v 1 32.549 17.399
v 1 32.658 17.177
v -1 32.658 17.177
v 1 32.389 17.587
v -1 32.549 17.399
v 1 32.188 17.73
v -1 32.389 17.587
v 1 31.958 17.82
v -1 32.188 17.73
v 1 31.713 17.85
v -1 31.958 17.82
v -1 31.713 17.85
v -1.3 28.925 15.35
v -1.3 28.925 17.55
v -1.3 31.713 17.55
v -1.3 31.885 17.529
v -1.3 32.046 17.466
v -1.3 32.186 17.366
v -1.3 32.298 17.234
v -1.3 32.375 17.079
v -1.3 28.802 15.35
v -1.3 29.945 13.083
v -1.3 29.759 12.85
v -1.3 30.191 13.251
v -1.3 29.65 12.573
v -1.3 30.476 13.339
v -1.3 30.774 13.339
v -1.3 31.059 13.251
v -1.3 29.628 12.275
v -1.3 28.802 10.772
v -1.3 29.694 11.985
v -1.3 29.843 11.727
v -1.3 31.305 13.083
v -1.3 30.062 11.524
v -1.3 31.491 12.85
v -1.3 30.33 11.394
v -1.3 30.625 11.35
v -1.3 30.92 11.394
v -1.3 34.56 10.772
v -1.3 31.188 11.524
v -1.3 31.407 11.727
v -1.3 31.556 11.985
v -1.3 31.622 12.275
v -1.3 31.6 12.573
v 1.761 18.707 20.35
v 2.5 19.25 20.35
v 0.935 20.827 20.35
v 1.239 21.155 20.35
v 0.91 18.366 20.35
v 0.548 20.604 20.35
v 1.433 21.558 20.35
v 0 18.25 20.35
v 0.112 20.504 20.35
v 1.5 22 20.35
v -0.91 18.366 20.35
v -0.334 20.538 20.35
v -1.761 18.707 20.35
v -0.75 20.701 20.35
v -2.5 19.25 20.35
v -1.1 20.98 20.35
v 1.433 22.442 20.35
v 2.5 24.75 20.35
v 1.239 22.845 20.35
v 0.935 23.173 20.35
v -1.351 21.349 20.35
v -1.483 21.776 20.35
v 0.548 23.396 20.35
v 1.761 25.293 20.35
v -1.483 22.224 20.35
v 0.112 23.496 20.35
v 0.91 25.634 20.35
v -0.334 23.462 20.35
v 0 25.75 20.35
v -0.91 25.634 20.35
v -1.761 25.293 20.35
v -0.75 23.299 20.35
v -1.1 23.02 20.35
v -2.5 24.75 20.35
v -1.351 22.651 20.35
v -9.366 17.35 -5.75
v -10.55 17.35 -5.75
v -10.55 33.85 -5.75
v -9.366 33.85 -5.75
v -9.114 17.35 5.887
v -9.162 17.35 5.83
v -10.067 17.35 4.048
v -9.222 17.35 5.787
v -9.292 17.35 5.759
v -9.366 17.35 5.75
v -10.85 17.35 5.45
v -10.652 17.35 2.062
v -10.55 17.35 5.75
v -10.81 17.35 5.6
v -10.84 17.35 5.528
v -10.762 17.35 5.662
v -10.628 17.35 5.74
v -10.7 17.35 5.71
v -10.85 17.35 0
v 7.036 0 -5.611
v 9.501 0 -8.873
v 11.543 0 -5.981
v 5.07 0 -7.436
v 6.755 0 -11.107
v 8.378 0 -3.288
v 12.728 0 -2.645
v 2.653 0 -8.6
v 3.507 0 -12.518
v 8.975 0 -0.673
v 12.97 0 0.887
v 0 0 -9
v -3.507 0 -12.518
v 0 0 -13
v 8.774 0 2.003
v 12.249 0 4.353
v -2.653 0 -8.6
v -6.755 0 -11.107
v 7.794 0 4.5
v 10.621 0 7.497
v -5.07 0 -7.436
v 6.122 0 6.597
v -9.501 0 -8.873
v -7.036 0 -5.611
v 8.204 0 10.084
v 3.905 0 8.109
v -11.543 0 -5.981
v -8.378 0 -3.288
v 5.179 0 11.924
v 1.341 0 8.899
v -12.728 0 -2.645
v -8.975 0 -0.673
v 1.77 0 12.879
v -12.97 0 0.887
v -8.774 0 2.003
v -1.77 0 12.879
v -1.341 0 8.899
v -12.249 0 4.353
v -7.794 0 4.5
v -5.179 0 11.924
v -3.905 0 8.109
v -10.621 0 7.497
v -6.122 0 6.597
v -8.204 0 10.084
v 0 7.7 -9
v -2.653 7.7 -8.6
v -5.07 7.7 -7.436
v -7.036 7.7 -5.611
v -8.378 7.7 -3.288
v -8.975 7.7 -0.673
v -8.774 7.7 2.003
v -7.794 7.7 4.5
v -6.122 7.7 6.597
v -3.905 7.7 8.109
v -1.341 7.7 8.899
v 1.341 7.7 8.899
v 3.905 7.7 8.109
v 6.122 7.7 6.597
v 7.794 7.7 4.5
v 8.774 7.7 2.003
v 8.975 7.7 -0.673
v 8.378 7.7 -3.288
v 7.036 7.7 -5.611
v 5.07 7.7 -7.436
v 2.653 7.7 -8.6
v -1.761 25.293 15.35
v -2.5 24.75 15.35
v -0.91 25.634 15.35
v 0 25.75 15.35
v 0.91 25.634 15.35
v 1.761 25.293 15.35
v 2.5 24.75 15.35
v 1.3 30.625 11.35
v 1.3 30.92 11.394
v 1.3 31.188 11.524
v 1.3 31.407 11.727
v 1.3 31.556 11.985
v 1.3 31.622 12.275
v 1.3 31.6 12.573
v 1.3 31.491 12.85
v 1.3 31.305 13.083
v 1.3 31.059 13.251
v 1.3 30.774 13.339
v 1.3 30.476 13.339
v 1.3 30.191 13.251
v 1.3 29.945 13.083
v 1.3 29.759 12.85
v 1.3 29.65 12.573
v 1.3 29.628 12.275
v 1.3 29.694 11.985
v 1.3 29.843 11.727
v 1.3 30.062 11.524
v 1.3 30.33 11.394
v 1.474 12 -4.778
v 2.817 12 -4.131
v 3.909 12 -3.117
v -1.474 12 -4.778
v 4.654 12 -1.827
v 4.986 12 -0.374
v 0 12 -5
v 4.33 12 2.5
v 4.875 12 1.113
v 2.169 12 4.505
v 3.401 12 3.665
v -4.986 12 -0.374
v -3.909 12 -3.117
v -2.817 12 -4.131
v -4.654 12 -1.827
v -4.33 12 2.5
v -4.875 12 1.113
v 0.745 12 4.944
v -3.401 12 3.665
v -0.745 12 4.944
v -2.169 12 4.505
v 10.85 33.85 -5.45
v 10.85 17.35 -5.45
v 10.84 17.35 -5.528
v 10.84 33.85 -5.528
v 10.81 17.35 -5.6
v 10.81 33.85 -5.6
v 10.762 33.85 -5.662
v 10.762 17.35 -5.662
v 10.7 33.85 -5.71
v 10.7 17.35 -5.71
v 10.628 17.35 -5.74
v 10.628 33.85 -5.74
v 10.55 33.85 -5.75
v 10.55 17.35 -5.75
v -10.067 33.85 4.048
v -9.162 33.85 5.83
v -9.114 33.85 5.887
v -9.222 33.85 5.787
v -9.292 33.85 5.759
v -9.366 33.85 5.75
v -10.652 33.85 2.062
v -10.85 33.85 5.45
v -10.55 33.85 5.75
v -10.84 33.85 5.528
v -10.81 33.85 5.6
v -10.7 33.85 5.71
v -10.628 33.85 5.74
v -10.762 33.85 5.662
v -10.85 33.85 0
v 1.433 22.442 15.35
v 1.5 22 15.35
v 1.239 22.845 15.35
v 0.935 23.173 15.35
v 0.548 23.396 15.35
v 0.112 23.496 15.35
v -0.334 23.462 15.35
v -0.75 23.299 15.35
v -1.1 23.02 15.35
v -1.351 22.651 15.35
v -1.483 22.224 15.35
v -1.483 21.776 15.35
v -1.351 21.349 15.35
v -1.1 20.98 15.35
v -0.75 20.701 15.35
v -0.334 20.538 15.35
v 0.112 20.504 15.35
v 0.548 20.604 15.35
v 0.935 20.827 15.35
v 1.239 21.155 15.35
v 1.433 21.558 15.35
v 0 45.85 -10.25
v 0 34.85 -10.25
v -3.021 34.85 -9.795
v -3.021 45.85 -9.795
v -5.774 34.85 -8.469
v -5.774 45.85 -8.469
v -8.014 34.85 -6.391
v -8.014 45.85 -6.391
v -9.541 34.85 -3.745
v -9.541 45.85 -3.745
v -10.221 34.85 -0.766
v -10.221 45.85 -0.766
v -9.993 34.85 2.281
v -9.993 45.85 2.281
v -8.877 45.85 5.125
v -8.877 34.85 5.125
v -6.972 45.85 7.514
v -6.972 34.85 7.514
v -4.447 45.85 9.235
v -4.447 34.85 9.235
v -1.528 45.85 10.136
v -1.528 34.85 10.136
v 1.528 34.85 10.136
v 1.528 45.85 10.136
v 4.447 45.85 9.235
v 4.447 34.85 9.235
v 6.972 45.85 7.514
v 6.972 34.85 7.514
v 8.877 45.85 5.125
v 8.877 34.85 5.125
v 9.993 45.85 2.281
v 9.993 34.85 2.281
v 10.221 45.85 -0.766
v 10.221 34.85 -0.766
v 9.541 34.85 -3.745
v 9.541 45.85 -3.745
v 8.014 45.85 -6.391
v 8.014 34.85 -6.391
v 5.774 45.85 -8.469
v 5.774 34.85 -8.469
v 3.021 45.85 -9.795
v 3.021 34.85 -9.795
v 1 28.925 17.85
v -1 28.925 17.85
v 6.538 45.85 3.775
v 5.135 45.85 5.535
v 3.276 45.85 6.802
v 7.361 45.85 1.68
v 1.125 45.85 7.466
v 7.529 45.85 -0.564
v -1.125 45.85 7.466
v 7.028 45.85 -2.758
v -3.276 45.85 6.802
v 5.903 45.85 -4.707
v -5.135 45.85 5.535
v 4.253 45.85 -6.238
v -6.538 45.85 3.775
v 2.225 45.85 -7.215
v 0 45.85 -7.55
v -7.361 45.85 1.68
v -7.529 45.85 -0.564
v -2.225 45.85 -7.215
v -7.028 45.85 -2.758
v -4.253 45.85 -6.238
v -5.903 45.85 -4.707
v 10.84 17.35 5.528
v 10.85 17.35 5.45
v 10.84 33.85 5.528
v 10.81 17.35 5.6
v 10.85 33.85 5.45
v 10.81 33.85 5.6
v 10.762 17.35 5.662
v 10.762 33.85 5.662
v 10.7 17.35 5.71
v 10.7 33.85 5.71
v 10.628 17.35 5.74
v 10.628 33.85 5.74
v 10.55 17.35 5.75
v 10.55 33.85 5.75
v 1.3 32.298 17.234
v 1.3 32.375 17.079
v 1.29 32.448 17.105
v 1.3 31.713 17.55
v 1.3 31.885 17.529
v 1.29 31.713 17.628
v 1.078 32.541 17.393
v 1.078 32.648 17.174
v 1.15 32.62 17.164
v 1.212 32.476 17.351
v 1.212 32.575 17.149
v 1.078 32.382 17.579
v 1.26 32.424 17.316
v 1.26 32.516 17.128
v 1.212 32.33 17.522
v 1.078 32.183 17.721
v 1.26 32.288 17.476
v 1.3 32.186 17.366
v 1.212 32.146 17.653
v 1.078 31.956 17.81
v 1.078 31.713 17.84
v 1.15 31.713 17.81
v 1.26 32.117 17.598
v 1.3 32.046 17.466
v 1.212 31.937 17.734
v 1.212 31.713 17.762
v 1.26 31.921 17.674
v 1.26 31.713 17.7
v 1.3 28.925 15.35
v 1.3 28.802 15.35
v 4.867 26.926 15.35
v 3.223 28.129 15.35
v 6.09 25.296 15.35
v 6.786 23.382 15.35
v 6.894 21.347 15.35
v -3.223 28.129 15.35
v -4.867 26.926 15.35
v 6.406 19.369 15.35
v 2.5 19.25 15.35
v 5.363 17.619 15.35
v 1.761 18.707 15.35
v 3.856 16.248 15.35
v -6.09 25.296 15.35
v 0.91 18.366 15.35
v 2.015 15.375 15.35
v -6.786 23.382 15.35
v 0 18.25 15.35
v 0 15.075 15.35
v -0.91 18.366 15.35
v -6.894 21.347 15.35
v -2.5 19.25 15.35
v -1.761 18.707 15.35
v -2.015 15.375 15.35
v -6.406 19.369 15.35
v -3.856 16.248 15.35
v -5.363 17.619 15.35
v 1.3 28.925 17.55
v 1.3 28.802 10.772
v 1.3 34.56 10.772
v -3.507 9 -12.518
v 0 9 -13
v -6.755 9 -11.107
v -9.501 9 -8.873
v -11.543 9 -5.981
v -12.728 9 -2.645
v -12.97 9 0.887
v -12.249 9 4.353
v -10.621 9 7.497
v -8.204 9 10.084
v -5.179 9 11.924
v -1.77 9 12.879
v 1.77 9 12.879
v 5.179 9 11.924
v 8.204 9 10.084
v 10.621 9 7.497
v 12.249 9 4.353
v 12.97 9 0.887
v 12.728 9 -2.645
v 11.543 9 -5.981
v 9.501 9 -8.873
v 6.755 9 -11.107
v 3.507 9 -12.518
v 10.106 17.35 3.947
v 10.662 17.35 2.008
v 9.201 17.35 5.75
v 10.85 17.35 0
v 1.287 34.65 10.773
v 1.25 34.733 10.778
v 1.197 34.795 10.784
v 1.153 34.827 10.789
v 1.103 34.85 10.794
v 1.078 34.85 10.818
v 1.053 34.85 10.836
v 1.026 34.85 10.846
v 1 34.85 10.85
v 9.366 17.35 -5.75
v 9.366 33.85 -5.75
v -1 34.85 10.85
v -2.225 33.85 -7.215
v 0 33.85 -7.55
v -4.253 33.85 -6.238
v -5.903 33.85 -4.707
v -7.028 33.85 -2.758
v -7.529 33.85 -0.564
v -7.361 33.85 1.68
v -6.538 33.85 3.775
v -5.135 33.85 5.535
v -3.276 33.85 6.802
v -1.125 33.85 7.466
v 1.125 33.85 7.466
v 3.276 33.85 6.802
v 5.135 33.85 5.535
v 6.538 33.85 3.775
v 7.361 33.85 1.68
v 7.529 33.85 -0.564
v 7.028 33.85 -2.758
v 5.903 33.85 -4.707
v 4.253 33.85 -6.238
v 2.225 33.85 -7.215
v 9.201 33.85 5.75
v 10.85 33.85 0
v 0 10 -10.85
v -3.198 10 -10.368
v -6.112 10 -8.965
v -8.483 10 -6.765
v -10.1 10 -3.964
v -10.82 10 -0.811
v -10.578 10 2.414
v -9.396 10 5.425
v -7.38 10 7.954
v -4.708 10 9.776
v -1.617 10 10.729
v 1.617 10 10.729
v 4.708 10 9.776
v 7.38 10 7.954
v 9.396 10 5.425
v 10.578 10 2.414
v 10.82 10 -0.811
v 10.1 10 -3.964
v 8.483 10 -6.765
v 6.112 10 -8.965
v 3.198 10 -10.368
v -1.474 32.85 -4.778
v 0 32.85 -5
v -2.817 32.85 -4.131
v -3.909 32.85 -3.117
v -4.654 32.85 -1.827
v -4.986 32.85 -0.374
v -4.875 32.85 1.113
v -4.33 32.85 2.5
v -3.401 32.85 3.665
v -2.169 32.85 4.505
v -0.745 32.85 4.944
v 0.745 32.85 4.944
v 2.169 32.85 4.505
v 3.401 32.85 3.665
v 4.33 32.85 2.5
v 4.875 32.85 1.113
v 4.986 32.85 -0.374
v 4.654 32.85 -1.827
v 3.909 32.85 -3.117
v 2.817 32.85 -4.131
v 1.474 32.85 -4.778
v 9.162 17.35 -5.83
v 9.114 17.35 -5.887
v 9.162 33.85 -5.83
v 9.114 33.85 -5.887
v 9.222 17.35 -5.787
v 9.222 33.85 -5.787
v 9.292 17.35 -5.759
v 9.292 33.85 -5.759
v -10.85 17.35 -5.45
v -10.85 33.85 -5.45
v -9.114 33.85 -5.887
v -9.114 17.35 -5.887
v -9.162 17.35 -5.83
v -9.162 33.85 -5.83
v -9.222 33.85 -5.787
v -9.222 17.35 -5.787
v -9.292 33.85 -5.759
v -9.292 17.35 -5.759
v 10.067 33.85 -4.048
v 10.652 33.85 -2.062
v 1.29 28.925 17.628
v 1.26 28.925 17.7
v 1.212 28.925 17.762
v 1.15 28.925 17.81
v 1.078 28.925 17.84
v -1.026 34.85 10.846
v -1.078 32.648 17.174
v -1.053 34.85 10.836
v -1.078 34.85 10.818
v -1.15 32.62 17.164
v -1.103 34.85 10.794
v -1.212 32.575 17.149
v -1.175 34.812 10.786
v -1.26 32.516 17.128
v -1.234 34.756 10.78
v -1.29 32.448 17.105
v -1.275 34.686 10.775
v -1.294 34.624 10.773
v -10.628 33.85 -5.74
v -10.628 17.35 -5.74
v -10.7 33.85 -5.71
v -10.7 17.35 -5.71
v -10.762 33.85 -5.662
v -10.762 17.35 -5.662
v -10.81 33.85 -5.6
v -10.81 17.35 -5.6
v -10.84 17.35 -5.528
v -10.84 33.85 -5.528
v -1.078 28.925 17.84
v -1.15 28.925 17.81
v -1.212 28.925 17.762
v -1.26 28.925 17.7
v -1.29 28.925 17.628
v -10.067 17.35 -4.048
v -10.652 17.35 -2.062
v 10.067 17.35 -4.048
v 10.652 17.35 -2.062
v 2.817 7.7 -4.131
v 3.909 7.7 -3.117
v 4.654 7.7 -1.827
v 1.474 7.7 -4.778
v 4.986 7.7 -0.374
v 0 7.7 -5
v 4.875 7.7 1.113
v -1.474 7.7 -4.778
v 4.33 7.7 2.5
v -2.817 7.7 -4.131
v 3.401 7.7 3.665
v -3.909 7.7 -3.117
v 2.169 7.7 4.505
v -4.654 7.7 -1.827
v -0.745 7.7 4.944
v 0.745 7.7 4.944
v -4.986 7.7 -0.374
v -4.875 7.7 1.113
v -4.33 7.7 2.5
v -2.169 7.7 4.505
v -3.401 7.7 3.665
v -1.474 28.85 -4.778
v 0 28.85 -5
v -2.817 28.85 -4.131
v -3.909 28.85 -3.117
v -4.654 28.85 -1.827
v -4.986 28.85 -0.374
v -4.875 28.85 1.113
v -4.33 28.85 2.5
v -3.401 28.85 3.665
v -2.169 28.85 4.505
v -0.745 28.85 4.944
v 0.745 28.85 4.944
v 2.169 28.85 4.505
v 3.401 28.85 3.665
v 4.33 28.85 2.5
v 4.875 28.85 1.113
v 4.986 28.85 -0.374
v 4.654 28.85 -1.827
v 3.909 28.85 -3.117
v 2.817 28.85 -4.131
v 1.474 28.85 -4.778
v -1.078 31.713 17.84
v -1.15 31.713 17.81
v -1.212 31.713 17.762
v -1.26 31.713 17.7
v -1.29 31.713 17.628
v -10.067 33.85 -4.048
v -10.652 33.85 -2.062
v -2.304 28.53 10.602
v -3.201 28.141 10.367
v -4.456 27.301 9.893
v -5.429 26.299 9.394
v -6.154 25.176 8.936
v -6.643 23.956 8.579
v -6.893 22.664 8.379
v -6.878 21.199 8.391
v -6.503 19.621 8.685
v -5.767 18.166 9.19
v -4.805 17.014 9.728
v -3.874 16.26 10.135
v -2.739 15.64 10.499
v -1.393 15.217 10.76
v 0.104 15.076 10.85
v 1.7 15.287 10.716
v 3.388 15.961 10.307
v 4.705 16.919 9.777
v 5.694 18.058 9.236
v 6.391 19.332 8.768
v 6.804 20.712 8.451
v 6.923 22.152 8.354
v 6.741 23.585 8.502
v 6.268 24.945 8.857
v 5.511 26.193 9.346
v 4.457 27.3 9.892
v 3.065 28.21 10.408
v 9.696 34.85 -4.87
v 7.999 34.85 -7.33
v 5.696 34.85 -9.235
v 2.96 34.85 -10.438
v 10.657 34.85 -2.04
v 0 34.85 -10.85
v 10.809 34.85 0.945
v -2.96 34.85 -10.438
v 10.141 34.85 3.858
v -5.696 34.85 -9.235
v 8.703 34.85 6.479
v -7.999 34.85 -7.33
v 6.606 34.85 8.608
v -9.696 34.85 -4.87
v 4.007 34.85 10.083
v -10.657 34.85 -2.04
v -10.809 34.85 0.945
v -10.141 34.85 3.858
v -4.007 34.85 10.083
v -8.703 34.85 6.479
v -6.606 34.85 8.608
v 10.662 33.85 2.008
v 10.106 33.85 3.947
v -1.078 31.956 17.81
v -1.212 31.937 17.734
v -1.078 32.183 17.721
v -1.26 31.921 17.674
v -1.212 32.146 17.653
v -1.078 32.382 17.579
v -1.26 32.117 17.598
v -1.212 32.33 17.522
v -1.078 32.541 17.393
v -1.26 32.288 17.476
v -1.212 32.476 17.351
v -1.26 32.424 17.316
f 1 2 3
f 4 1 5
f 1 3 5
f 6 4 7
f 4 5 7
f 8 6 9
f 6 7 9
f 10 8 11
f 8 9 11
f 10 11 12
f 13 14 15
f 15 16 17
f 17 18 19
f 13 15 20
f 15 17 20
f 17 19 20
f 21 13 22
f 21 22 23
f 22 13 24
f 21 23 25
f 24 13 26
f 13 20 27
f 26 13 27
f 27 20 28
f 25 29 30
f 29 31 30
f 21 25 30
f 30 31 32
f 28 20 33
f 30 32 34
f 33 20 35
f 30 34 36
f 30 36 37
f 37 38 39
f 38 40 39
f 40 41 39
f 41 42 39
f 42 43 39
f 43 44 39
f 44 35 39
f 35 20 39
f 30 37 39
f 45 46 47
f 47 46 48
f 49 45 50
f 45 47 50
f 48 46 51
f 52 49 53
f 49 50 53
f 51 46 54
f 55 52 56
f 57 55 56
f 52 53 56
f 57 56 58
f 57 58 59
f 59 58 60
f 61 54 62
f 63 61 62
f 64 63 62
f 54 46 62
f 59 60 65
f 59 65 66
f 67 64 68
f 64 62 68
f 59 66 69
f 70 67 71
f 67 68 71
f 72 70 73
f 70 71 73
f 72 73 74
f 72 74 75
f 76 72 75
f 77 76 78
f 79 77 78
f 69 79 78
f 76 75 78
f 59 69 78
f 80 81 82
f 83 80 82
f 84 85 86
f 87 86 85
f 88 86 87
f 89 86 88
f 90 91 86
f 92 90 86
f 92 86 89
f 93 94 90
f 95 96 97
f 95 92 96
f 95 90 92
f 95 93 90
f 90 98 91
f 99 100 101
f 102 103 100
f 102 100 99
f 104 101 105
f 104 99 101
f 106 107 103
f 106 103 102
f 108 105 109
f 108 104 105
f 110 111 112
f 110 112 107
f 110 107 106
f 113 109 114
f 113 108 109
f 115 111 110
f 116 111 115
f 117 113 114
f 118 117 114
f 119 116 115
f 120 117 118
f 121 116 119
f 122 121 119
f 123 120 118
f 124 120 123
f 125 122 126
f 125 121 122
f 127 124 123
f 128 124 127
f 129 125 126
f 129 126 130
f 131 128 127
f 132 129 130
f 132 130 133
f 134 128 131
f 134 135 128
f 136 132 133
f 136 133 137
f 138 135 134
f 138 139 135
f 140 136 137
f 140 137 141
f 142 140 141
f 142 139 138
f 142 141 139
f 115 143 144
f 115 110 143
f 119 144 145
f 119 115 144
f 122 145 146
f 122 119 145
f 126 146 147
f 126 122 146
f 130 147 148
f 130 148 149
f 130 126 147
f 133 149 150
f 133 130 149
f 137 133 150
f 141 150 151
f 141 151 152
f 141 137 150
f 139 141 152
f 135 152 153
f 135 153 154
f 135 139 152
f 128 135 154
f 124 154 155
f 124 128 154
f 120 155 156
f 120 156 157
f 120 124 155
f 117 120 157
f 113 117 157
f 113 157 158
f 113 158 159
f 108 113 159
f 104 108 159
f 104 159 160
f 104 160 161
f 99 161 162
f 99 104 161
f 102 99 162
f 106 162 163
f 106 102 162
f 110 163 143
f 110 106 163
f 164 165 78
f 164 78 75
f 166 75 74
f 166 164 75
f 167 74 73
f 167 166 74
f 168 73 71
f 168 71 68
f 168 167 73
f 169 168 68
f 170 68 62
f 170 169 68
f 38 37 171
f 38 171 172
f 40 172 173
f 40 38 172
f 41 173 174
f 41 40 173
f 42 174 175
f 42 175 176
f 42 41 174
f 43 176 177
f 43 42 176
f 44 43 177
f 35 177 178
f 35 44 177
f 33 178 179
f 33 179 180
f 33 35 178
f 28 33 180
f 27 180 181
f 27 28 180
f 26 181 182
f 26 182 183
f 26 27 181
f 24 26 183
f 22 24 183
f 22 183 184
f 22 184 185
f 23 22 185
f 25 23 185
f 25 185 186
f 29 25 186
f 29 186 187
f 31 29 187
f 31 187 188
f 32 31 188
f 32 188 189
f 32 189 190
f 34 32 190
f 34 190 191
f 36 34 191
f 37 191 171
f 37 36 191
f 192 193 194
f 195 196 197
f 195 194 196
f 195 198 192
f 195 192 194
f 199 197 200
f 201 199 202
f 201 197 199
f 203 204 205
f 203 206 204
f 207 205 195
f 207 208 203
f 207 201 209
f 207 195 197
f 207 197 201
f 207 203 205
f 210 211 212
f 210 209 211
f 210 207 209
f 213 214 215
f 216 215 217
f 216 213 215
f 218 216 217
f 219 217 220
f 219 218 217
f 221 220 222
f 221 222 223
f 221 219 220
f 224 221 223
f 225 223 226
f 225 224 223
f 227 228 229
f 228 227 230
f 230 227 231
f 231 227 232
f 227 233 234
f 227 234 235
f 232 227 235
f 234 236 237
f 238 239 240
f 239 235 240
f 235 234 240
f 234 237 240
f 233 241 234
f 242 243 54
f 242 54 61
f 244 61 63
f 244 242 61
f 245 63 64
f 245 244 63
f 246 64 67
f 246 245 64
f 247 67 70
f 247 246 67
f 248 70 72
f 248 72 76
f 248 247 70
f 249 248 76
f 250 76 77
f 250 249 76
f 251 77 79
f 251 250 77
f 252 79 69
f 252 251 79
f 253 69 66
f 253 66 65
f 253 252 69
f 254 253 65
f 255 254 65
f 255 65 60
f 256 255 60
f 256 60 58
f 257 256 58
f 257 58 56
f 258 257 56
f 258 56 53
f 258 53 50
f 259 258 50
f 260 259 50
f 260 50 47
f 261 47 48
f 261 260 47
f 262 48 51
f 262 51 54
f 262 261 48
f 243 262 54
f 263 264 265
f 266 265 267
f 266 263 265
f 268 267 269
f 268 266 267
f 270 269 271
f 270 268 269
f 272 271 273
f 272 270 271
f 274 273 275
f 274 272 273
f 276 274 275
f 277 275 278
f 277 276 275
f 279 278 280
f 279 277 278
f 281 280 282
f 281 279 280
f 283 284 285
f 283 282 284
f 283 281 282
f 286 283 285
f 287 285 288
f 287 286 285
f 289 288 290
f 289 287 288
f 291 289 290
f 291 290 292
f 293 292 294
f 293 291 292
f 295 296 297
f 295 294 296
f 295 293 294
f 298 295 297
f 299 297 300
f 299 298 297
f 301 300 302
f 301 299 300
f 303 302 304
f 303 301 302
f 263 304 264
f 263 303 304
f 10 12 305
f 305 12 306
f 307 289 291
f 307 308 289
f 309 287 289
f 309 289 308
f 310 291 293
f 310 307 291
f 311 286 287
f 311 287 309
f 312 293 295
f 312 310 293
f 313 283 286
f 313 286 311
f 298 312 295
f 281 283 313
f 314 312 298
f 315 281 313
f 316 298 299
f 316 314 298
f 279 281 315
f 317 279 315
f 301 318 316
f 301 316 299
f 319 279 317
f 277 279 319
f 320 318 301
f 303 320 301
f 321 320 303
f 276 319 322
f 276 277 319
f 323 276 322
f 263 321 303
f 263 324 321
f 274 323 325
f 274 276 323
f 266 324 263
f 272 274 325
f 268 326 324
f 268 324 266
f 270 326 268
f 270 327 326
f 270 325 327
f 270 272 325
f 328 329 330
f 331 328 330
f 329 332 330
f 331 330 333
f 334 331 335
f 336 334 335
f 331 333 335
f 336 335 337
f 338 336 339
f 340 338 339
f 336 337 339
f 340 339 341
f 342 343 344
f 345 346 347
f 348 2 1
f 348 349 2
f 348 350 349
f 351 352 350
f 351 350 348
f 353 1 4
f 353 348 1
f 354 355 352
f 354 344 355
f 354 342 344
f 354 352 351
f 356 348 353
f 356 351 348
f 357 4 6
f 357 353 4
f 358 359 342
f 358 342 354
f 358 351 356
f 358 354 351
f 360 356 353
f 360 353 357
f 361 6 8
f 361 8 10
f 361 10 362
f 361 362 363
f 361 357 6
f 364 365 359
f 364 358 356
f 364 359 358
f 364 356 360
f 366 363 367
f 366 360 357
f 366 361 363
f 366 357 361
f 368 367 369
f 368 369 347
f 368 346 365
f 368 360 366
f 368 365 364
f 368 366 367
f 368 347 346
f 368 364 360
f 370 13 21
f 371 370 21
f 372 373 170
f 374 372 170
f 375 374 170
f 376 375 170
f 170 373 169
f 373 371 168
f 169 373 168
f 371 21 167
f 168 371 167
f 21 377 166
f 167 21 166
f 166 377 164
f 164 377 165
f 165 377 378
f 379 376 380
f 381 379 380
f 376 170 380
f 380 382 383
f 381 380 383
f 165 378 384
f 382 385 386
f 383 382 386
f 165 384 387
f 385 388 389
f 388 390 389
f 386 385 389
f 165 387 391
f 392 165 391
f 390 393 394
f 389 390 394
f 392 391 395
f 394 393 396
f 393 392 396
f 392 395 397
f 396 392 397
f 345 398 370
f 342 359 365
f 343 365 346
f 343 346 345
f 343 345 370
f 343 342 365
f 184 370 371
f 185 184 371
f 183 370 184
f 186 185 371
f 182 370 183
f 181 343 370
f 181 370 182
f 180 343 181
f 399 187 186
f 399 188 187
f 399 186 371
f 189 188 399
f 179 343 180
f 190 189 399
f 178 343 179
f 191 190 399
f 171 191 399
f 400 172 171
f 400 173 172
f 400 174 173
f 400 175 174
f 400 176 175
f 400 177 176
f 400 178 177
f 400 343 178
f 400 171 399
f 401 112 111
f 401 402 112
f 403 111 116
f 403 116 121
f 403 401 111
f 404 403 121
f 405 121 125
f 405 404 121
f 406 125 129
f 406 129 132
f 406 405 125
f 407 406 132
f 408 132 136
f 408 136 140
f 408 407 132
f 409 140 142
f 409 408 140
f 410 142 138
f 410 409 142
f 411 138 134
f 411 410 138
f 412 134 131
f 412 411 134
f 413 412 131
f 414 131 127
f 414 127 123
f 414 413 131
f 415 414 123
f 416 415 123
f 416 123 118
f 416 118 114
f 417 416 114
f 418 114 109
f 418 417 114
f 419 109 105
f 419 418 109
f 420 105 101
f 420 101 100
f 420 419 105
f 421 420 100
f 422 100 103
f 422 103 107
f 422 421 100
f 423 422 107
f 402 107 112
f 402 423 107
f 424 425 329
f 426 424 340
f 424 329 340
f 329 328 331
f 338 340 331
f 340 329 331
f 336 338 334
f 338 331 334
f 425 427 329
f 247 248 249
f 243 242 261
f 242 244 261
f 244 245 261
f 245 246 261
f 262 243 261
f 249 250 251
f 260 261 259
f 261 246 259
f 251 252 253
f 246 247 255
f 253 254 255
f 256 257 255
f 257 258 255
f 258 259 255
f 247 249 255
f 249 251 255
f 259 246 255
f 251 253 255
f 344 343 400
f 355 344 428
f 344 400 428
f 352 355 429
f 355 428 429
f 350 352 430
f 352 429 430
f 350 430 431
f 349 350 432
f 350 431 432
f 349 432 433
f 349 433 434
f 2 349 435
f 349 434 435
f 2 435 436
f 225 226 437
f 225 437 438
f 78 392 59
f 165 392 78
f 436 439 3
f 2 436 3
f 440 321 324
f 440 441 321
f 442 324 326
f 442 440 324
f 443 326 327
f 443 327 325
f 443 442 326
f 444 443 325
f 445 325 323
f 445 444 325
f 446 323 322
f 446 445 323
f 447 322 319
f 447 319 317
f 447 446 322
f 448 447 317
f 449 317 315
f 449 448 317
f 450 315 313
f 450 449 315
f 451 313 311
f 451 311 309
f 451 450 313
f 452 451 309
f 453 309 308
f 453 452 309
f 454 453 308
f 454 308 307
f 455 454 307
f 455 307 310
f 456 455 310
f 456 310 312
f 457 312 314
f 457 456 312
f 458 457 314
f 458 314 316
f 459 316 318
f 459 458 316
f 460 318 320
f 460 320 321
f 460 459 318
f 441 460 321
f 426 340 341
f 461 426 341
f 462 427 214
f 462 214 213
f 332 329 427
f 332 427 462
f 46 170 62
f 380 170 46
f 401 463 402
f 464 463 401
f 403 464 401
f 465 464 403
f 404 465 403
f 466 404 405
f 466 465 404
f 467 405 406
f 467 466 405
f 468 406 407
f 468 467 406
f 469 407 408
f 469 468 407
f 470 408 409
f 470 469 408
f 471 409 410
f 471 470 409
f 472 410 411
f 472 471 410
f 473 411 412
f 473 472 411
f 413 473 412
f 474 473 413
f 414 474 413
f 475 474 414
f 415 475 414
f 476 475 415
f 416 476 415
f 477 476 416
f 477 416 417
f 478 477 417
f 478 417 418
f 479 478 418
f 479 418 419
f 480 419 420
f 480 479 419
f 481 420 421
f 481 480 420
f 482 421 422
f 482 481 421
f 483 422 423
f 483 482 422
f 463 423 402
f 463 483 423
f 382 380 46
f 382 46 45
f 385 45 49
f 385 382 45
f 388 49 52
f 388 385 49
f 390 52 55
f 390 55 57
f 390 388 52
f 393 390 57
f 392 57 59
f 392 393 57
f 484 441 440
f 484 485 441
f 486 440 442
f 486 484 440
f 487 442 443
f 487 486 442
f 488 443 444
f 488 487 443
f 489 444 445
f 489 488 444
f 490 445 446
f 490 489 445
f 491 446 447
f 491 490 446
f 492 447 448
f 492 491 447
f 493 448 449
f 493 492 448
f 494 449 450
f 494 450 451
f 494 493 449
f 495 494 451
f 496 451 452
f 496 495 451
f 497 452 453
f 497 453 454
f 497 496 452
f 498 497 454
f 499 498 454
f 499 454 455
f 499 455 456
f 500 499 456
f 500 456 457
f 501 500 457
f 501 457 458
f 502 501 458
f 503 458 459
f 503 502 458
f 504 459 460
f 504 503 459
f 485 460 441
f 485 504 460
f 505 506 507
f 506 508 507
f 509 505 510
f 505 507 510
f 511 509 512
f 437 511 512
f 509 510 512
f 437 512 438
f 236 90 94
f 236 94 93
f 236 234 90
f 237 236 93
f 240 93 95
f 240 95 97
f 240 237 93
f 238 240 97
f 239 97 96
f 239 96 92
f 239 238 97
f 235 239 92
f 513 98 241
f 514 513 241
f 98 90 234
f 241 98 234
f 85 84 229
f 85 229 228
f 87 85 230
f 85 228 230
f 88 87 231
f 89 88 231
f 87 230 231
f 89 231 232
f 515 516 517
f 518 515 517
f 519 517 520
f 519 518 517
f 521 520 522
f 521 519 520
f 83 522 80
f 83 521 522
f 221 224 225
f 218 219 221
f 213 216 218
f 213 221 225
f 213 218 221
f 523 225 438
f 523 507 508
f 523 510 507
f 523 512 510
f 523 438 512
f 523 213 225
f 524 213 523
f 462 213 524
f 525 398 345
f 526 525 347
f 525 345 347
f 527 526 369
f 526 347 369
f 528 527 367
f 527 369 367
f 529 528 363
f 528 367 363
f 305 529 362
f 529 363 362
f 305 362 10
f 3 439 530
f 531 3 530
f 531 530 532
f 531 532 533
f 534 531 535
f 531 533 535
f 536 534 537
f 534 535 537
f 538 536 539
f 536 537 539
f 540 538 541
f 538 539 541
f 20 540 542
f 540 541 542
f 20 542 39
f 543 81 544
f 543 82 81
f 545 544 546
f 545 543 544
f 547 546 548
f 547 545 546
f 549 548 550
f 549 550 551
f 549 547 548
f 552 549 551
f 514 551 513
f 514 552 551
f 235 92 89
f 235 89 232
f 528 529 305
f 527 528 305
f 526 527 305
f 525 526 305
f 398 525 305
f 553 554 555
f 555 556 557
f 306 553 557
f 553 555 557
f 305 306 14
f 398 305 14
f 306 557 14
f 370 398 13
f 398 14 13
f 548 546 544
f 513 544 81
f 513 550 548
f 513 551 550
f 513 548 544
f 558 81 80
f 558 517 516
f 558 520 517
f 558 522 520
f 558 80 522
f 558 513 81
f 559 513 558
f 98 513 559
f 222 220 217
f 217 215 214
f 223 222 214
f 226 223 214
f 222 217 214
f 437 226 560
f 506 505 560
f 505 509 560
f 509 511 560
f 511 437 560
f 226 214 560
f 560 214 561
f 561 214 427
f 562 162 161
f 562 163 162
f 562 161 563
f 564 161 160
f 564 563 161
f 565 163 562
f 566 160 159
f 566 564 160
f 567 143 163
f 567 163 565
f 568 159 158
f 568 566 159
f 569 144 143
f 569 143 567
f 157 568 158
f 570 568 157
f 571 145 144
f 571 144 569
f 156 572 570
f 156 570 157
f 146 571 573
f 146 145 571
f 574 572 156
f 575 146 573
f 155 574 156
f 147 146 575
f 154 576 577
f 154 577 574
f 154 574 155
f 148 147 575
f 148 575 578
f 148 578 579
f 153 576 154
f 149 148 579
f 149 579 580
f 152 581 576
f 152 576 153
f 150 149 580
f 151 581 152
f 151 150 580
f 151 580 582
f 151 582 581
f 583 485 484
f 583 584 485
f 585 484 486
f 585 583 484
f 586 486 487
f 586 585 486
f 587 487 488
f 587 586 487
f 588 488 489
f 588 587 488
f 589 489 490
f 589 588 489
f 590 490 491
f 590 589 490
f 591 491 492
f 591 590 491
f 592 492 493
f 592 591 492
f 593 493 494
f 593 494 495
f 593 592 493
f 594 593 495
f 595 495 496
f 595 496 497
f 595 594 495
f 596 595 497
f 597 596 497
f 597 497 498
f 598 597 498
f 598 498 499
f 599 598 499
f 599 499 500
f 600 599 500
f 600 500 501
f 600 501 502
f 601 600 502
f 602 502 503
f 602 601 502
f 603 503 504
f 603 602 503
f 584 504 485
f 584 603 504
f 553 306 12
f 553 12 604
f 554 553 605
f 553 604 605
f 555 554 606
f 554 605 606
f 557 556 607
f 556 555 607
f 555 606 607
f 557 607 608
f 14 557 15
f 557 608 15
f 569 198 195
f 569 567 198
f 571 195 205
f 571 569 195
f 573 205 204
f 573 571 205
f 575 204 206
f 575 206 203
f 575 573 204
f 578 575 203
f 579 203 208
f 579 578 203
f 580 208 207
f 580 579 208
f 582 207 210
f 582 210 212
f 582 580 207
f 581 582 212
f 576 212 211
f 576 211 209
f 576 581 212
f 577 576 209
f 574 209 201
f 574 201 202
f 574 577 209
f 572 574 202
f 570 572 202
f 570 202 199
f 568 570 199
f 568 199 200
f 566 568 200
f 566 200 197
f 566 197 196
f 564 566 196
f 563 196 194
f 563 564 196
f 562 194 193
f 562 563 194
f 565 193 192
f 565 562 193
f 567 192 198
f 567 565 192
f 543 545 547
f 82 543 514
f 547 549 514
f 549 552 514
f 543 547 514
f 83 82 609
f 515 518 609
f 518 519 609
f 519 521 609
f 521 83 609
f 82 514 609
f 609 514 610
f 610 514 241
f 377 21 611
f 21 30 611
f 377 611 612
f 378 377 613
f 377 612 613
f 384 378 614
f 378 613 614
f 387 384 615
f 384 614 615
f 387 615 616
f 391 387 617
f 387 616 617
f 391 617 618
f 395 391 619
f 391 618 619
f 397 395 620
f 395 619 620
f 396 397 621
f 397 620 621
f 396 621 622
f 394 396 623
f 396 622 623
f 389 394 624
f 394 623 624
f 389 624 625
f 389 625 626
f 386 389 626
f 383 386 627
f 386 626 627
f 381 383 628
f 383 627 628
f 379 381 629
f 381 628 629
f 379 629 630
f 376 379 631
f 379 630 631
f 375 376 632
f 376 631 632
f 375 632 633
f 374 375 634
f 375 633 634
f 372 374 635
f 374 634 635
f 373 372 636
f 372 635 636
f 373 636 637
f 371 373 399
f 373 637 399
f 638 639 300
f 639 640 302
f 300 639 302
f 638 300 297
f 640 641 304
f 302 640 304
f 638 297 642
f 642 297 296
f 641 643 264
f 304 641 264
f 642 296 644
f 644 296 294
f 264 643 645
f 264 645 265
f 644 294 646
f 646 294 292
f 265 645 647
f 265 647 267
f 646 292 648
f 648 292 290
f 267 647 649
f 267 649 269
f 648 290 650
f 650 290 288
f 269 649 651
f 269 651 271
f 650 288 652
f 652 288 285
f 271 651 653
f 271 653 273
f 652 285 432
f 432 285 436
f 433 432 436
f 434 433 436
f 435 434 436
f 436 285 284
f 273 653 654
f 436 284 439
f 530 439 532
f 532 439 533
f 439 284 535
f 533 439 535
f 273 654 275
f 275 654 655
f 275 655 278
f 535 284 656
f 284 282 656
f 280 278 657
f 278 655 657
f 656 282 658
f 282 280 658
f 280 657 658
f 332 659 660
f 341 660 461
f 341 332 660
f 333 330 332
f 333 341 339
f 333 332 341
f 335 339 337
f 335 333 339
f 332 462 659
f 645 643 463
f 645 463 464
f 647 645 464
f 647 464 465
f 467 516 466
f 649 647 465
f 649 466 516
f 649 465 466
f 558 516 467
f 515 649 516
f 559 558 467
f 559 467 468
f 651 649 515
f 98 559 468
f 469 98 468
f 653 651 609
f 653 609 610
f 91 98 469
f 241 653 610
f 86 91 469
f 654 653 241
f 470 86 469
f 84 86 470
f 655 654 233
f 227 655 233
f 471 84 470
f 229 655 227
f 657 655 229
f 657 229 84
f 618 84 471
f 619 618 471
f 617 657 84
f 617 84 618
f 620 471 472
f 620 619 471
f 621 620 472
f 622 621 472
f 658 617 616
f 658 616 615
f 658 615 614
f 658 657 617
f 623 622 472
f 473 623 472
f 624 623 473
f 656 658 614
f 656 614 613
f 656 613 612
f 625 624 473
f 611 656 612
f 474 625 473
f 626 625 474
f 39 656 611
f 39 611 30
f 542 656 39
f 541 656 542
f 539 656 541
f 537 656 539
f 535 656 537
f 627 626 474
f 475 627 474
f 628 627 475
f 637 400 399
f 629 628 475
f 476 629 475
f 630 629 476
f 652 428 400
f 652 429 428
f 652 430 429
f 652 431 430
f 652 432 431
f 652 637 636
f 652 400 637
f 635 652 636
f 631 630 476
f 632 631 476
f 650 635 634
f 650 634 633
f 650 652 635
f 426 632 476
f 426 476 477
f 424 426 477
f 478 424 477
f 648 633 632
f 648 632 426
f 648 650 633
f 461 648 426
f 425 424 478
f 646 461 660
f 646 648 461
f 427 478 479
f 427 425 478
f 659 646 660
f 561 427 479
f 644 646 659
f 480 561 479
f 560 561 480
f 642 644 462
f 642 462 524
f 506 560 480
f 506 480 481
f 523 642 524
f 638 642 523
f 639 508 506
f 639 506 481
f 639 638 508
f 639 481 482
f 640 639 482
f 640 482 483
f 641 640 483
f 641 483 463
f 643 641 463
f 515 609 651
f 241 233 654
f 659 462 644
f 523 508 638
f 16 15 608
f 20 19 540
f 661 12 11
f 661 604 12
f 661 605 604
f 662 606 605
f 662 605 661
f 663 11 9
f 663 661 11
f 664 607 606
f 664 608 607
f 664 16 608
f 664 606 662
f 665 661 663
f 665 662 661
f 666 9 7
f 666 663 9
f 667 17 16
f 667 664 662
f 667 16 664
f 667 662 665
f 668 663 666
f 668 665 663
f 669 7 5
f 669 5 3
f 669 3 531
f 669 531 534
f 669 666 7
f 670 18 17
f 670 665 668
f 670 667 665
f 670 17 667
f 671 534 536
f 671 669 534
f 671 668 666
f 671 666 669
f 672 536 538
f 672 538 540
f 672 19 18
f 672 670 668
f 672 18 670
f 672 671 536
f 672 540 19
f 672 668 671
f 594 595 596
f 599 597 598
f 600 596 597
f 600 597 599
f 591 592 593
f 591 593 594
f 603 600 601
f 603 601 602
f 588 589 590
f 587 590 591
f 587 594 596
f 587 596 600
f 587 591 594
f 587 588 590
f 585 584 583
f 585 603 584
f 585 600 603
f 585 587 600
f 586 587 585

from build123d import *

# Parameters (mm, degrees)
SKETCH2_W                = 16.5
SKETCH2_H                = 11.5
BOSS_EXTRUDE1_DEPTH      = 2
BOSS_EXTRUDE2_DEPTH      = 4.5
BOSS_EXTRUDE2_DEPTH_BACK = 3
SKETCH3_R                = 6.925
BOSS_EXTRUDE6_DEPTH      = 1.3
BOSS_EXTRUDE6_DEPTH_BACK = 1.3
SKETCH4_R                = 1
FILLET2_R                = 0.3
FILLET4_R                = 0.3
FILLET7_R                = 0.3
FILLET8_R                = 0.3
FILLET9_R                = 0.3
FILLET10_R               = 0.3
FILLET11_R               = 0.3
FILLET12_R               = 0.3
SKETCH5_R                = 1.5
BOSS_EXTRUDE7_DEPTH      = 5
FILLET13_R               = 1


with BuildPart() as part:
    # Sketch1 → Revolve1 (revolve)
    with BuildSketch(Plane.XY, mode=Mode.PRIVATE) as revolve1_sk:
        Polygon((7.55, 45.85), (7.55, 33.85), (5, 32.85), (5, 28.85), (0, 28.85), (0, 12), (5, 12), (5, 7.7), (9, 7.7), (9, 0), (13, 0), (13, 9), (10.85, 10), (10.85, 34.85), (10.25, 34.85), (10.25, 45.85), align=None)
    revolve(revolve1_sk.sketch.rotate(Axis((0, 0, 0), (0, 1, 0)), 90), axis=Axis((0, 0, 0), (0, 1, 0)))

    # Sketch2 → Boss-Extrude1 (add)
    with BuildSketch(Plane.YZ.offset(10.85)):
        with Locations((25.6, 0)):
            Rectangle(SKETCH2_W, SKETCH2_H)
    boss_extrude1 = extrude(amount=-BOSS_EXTRUDE1_DEPTH)

    # Mirror1: Boss-Extrude1 across plane
    add(boss_extrude1.mirror(Plane(origin=(0, 0, 0), x_dir=(0, 0, 1), z_dir=(1, 0, 0))))

    # Sketch3 → Boss-Extrude2 (add, two sides: drawn at the far end of the back side and taken through both)
    with BuildSketch(Plane(origin=(0, 0, 10.85), x_dir=(0, -1, 0), z_dir=(0, 0, 1)).offset(-BOSS_EXTRUDE2_DEPTH_BACK)):
        with Locations(Location((-22, 0, 0), (0, 0, 90))):
            Circle(SKETCH3_R)
    extrude(amount=BOSS_EXTRUDE2_DEPTH + BOSS_EXTRUDE2_DEPTH_BACK)

    # Sketch4 → Boss-Extrude6 (add, two sides: drawn at the far end of the back side and taken through both)
    with BuildSketch(Plane(origin=(0, 0, 0), x_dir=(0, 0, -1), z_dir=(1, 0, 0)).offset(-BOSS_EXTRUDE6_DEPTH_BACK)):
        Polygon((-10.85, 34.85), (-17.85, 32.425), (-17.85, 28.925), (-15.35, 28.925), (-15.35, 27.925), (-10.25, 27.925), (-10.25, 34.85), align=None)
        with Locations((-12.35, 30.625)):
            Circle(SKETCH4_R, mode=Mode.SUBTRACT)
    extrude(amount=BOSS_EXTRUDE6_DEPTH + BOSS_EXTRUDE6_DEPTH_BACK)

    # Fillet2
    fillet2_edges = [part.edges().sort_by_distance(p)[0] for p in [
        (-9.201086892, 25.6, 5.75),
    ]]
    fillet(fillet2_edges, radius=FILLET2_R)

    # Fillet4
    fillet4_edges = [part.edges().sort_by_distance(p)[0] for p in [
        (10.85, 25.6, 5.75),
    ]]
    fillet(fillet4_edges, radius=FILLET4_R)

    # Fillet7
    fillet7_edges = [part.edges().sort_by_distance(p)[0] for p in [
        (10.85, 25.6, -5.75),
    ]]
    fillet(fillet7_edges, radius=FILLET7_R)

    # Fillet8
    fillet8_edges = [part.edges().sort_by_distance(p)[0] for p in [
        (-10.85, 25.6, -5.75),
    ]]
    fillet(fillet8_edges, radius=FILLET8_R)

    # Fillet9
    fillet9_edges = [part.edges().sort_by_distance(p)[0] for p in [
        (-10.85, 25.6, 5.75),
    ]]
    fillet(fillet9_edges, radius=FILLET9_R)

    # Fillet10
    # the kernel refuses this fillet: 0.3 mm, written as the material it takes off along each edge
    with BuildSketch(Plane(origin=(1.3, 33.175, 17.85), x_dir=(0, 0, -1), z_dir=(0, -1, 0))) as fillet10_piece_1:
        with BuildLine():
            CenterArc((FILLET10_R, -FILLET10_R), FILLET10_R, 90, 90)
            Line((0, -FILLET10_R), (0, 0))
            Line((0, 0), (FILLET10_R, 0))
        make_face()
    extrude(amount=5, mode=Mode.SUBTRACT)
    with BuildSketch(Plane(origin=(-1.3, 35.095506775, 10.141320648), x_dir=(0, -0.9449058020160995, -0.3273423671270065), z_dir=(0, -0.3273423671270065, 0.9449058020160995))) as fillet10_piece_2_section:
        with BuildLine():
            CenterArc((FILLET10_R, FILLET10_R), FILLET10_R, 180, 90)
            Line((0, FILLET10_R), (0, 0))
            Line((0, 0), (FILLET10_R, 0))
        make_face()
    fillet10_piece_2 = extrude(amount=8.908145854, mode=Mode.PRIVATE)
    fillet10_piece_2 = fillet10_piece_2 - Plane(origin=(0, 33.459049613, 0), x_dir=(0, 0, -1), z_dir=(0, 1, 0)) * Cylinder(10.85, 20, mode=Mode.PRIVATE)
    add(fillet10_piece_2, mode=Mode.SUBTRACT)
    with BuildSketch(Plane(origin=(-1.3, 33.175, 17.85), x_dir=(0, 0, -1), z_dir=(0, -1, 0))) as fillet10_piece_3:
        with BuildLine():
            CenterArc((FILLET10_R, FILLET10_R), FILLET10_R, 180, 90)
            Line((0, FILLET10_R), (0, 0))
            Line((0, 0), (FILLET10_R, 0))
        make_face()
    extrude(amount=5, mode=Mode.SUBTRACT)
    with BuildSketch(Plane(origin=(1.3, 35.095506775, 10.141320648), x_dir=(0, -0.9449058020160995, -0.3273423671270065), z_dir=(0, -0.3273423671270065, 0.9449058020160995))) as fillet10_piece_4_section:
        with BuildLine():
            CenterArc((FILLET10_R, -FILLET10_R), FILLET10_R, 90, 90)
            Line((0, -FILLET10_R), (0, 0))
            Line((0, 0), (FILLET10_R, 0))
        make_face()
    fillet10_piece_4 = extrude(amount=8.908145854, mode=Mode.PRIVATE)
    fillet10_piece_4 = fillet10_piece_4 - Plane(origin=(0, 33.459049613, 0), x_dir=(0, 0, -1), z_dir=(0, 1, 0)) * Cylinder(10.85, 20, mode=Mode.PRIVATE)
    add(fillet10_piece_4, mode=Mode.SUBTRACT)

    # Fillet11
    fillet11_edges = [part.edges().sort_by_distance(p)[0] for p in [
        (9.201086892, 25.6, -5.75),
    ]]
    fillet(fillet11_edges, radius=FILLET11_R)

    # Fillet12
    fillet12_edges = [part.edges().sort_by_distance(p)[0] for p in [
        (-9.201086892, 25.6, -5.75),
    ]]
    fillet(fillet12_edges, radius=FILLET12_R)

    # Sketch5 → Boss-Extrude7 (add)
    with BuildSketch(Plane.XY.offset(15.35)):
        with BuildLine():
            Line((-2.5, 19.25), (-2.5, 24.75))
            ThreePointArc((-2.5, 24.75), (0, 25.75), (2.5, 24.75))
            Line((2.5, 24.75), (2.5, 19.25))
            ThreePointArc((2.5, 19.25), (0, 18.25), (-2.5, 19.25))
        make_face()
        with Locations((0, 22)):
            Circle(SKETCH5_R, mode=Mode.SUBTRACT)
    extrude(amount=BOSS_EXTRUDE7_DEPTH)

    # Fillet13
    # the kernel refuses this fillet: 1 mm, written as the material it takes off along each edge
    with BuildSketch(Plane(origin=(-1.3, 31.713122021, 16.85), x_dir=(0, 0, 1), z_dir=(0, -1, 0))) as fillet13_piece_1:
        with BuildLine():
            CenterArc((0.7, -0.3), 0.3, 0, 90)
            Line((1, -0.3), (1, 0))
            Line((1, 0), (0.7, 0))
        make_face()
    revolve(axis=Axis((-1.3, 31.713122021, 16.85), (-1, 0, 0)), revolution_arc=70.892452859, mode=Mode.SUBTRACT)
    with BuildSketch(Plane(origin=(1.3, 31.713122021, 16.85), x_dir=(0, 0.9449058020160994, 0.32734236712700643), z_dir=(0, 0.32734236712700643, -0.9449058020160994))) as fillet13_piece_2:
        with BuildLine():
            CenterArc((0.7, -0.3), 0.3, 0, 90)
            Line((1, -0.3), (1, 0))
            Line((1, 0), (0.7, 0))
        make_face()
    revolve(axis=Axis((1.3, 31.713122021, 16.85), (1, 0, 0)), revolution_arc=70.892452859, mode=Mode.SUBTRACT)
    with BuildSketch(Plane(origin=(-1.3, 32.425, 17.85), x_dir=(0, 0.32734236712700615, -0.9449058020160995), z_dir=(1, 0, 0))) as fillet13_piece_3:
        with BuildLine():
            CenterArc((FILLET13_R * 0.711877979199, -FILLET13_R), FILLET13_R, 90, 70.892452859)
            Line((-FILLET13_R * 0.233027822817, -FILLET13_R * 0.672657632873), (0, 0))
            Line((0, 0), (FILLET13_R * 0.711877979199, 0))
        make_face()
    extrude(amount=2.6, mode=Mode.SUBTRACT)


solid = part.part
